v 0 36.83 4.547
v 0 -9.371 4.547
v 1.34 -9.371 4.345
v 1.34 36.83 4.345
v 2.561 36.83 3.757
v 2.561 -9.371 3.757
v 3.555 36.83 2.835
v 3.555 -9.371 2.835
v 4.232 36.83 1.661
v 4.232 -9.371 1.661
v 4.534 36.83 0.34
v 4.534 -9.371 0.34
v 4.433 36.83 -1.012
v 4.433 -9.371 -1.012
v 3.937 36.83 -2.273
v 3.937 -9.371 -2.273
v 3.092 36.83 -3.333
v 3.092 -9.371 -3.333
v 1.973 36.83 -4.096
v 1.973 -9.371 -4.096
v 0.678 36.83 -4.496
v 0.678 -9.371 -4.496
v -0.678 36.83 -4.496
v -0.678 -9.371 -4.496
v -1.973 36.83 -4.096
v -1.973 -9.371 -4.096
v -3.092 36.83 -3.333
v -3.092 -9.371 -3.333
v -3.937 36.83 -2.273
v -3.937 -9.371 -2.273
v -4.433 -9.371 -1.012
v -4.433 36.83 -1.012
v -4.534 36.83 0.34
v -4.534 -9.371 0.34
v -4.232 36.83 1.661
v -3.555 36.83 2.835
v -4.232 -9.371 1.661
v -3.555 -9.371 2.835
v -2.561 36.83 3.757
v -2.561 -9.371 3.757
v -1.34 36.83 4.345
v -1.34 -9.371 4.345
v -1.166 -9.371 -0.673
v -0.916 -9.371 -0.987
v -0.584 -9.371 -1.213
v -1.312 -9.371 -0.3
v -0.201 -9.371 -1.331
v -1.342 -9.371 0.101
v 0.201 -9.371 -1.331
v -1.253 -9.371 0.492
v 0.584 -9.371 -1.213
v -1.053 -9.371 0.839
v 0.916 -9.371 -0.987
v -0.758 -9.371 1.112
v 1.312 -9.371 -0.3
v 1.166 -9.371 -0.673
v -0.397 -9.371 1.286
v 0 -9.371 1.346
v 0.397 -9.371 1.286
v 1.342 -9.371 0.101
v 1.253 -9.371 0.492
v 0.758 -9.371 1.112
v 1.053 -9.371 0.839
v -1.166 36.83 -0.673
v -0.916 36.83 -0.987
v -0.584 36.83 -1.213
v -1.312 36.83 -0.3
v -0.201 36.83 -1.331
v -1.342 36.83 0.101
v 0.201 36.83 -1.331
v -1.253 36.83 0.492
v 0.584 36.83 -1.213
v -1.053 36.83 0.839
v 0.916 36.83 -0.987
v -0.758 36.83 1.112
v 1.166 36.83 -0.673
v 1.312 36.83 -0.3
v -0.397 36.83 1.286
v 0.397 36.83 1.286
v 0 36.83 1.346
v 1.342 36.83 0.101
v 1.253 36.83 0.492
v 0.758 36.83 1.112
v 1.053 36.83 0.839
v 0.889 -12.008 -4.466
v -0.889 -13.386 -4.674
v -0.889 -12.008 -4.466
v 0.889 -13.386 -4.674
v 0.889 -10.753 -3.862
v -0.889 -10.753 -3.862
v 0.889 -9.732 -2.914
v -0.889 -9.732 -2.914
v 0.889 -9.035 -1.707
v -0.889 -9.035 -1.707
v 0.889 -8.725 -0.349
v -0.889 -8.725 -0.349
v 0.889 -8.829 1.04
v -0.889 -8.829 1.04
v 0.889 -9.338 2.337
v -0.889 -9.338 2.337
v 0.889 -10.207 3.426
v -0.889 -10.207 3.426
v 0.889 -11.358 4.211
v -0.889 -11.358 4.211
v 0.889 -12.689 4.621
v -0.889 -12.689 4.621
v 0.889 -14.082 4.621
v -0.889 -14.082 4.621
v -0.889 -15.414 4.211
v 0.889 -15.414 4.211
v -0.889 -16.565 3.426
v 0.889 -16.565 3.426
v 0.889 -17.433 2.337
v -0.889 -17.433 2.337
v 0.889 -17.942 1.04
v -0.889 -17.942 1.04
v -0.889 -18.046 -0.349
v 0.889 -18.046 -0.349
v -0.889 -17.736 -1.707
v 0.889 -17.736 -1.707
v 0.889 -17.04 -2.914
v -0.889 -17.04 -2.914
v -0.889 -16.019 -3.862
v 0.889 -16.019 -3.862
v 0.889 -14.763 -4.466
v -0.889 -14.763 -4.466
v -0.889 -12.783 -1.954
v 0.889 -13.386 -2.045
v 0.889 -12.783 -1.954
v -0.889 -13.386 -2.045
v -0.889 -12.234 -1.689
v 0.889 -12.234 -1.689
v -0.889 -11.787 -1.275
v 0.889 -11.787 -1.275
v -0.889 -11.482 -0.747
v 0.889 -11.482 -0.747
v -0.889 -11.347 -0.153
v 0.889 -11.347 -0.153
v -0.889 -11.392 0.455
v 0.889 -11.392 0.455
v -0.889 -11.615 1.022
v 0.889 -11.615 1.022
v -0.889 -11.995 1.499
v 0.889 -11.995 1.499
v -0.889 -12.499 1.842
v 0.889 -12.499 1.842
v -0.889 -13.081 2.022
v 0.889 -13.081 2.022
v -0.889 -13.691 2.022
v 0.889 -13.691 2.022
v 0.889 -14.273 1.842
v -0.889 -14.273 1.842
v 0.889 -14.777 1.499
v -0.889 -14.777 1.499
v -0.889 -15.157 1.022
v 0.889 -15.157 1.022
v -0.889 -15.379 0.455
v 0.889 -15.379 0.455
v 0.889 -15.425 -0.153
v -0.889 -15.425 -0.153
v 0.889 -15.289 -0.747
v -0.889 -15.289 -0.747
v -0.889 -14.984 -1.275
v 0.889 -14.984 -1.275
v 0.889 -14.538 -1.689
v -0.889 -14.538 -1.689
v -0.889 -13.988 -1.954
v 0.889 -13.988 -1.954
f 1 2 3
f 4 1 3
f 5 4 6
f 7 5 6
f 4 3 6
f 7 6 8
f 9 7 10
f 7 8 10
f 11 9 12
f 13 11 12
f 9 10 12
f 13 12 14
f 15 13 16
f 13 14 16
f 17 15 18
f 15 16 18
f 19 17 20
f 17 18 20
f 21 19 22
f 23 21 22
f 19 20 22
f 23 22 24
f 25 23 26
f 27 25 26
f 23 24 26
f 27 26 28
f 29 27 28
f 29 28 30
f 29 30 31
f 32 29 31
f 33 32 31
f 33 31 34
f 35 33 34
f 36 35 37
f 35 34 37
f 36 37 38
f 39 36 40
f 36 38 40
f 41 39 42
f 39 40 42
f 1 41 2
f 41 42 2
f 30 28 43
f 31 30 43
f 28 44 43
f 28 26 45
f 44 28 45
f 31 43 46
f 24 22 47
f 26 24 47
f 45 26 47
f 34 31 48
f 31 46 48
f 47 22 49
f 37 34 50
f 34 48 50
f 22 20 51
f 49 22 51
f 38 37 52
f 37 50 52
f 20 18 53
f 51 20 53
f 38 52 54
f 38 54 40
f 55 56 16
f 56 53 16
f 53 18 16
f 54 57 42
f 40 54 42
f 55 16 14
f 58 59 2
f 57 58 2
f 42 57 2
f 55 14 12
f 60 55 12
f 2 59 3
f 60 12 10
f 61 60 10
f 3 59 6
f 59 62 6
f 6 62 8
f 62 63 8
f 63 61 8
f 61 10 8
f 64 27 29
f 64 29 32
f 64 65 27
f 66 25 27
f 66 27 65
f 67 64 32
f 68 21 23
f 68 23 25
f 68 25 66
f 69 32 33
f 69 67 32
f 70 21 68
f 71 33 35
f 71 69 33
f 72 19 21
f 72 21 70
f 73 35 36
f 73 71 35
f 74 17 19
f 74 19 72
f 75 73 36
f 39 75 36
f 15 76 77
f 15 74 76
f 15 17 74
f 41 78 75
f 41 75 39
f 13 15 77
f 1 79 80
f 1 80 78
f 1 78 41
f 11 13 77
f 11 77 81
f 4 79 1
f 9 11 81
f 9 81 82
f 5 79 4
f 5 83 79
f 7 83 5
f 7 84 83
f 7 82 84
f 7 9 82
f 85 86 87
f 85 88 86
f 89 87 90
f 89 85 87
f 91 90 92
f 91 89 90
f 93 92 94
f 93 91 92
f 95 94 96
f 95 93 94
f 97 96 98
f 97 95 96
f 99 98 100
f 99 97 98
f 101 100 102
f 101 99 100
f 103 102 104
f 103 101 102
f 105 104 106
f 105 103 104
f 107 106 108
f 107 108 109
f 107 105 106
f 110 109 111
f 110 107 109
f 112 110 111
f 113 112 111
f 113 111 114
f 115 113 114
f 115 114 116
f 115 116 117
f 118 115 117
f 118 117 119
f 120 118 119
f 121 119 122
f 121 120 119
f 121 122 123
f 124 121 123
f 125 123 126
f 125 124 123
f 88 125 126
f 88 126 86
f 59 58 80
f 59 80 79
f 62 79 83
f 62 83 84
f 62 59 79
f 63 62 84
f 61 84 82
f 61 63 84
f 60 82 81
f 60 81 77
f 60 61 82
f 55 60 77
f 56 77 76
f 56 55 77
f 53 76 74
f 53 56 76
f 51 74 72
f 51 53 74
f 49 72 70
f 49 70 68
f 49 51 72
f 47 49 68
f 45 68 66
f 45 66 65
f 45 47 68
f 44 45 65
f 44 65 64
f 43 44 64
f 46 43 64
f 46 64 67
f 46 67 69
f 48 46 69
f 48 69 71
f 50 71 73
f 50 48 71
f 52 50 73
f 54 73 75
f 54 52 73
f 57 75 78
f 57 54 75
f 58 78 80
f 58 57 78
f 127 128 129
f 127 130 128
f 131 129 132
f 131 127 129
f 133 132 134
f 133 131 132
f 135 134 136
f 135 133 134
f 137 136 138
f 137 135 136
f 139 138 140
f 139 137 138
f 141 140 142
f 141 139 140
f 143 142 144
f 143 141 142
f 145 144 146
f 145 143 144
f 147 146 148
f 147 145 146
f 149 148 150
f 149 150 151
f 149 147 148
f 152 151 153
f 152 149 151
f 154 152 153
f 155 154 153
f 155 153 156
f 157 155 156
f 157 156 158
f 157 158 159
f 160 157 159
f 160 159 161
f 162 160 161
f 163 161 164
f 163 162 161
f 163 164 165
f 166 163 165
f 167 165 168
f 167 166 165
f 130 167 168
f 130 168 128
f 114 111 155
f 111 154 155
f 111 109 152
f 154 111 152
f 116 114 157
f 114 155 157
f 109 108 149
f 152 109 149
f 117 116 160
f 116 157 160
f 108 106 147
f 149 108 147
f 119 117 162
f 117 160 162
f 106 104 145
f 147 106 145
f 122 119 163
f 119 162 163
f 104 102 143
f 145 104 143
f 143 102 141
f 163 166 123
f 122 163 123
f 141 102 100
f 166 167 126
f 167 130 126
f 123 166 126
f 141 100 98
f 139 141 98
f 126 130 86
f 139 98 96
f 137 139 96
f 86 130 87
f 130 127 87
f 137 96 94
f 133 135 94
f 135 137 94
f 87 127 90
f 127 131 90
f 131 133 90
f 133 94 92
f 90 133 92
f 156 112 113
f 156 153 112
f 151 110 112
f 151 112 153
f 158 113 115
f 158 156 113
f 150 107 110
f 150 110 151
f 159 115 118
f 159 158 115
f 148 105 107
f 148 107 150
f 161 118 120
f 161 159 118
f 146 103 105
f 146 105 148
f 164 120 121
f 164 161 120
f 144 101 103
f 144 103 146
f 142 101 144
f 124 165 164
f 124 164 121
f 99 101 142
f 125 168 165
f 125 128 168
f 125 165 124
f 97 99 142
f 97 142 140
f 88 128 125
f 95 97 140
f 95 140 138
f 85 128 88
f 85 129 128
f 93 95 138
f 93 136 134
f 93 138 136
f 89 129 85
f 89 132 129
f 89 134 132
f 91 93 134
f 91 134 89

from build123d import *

# Parameters (mm, degrees)
EXTRUDE1_DEPTH      = 35.56
EXTRUDE1_DEPTH_BACK = 10.641310793
EXTRUDE1_START      = 1.27
SKETCH1_R           = 4.5466
SKETCH1_R_2         = 1.3462
SKETCH4_R           = 4.6736
SKETCH4_R_2         = 2.0447
EXTRUDE2_DEPTH      = 0.889


with BuildPart() as part:
    # Sketch1 → Extrude1 (new, two sides: drawn at the far end of the back side and taken through both)
    with BuildSketch(Plane(origin=(0, 0, 0), x_dir=(1, 0, 0), z_dir=(0, 1, 0)).offset(EXTRUDE1_START - EXTRUDE1_DEPTH_BACK)):
        with Locations(Location((0, 0, 0), (0, 0, 270))):
            Circle(SKETCH1_R)
        with Locations(Location((0, 0, 0), (0, 0, 270))):
            Circle(SKETCH1_R_2, mode=Mode.SUBTRACT)
    extrude(amount=EXTRUDE1_DEPTH + EXTRUDE1_DEPTH_BACK)


with BuildPart() as body_2:
    # Sketch4 → Extrude2 (new, symmetric)
    with BuildSketch(Plane(origin=(0, 0, 0), x_dir=(0, 0, -1), z_dir=(1, 0, 0))):
        with Locations((0, -13.3858)):
            Circle(SKETCH4_R)
        with Locations((0, -13.3858)):
            Circle(SKETCH4_R_2, mode=Mode.SUBTRACT)
    extrude(amount=EXTRUDE2_DEPTH, both=True)


solid = Compound([part.part, body_2.part])
